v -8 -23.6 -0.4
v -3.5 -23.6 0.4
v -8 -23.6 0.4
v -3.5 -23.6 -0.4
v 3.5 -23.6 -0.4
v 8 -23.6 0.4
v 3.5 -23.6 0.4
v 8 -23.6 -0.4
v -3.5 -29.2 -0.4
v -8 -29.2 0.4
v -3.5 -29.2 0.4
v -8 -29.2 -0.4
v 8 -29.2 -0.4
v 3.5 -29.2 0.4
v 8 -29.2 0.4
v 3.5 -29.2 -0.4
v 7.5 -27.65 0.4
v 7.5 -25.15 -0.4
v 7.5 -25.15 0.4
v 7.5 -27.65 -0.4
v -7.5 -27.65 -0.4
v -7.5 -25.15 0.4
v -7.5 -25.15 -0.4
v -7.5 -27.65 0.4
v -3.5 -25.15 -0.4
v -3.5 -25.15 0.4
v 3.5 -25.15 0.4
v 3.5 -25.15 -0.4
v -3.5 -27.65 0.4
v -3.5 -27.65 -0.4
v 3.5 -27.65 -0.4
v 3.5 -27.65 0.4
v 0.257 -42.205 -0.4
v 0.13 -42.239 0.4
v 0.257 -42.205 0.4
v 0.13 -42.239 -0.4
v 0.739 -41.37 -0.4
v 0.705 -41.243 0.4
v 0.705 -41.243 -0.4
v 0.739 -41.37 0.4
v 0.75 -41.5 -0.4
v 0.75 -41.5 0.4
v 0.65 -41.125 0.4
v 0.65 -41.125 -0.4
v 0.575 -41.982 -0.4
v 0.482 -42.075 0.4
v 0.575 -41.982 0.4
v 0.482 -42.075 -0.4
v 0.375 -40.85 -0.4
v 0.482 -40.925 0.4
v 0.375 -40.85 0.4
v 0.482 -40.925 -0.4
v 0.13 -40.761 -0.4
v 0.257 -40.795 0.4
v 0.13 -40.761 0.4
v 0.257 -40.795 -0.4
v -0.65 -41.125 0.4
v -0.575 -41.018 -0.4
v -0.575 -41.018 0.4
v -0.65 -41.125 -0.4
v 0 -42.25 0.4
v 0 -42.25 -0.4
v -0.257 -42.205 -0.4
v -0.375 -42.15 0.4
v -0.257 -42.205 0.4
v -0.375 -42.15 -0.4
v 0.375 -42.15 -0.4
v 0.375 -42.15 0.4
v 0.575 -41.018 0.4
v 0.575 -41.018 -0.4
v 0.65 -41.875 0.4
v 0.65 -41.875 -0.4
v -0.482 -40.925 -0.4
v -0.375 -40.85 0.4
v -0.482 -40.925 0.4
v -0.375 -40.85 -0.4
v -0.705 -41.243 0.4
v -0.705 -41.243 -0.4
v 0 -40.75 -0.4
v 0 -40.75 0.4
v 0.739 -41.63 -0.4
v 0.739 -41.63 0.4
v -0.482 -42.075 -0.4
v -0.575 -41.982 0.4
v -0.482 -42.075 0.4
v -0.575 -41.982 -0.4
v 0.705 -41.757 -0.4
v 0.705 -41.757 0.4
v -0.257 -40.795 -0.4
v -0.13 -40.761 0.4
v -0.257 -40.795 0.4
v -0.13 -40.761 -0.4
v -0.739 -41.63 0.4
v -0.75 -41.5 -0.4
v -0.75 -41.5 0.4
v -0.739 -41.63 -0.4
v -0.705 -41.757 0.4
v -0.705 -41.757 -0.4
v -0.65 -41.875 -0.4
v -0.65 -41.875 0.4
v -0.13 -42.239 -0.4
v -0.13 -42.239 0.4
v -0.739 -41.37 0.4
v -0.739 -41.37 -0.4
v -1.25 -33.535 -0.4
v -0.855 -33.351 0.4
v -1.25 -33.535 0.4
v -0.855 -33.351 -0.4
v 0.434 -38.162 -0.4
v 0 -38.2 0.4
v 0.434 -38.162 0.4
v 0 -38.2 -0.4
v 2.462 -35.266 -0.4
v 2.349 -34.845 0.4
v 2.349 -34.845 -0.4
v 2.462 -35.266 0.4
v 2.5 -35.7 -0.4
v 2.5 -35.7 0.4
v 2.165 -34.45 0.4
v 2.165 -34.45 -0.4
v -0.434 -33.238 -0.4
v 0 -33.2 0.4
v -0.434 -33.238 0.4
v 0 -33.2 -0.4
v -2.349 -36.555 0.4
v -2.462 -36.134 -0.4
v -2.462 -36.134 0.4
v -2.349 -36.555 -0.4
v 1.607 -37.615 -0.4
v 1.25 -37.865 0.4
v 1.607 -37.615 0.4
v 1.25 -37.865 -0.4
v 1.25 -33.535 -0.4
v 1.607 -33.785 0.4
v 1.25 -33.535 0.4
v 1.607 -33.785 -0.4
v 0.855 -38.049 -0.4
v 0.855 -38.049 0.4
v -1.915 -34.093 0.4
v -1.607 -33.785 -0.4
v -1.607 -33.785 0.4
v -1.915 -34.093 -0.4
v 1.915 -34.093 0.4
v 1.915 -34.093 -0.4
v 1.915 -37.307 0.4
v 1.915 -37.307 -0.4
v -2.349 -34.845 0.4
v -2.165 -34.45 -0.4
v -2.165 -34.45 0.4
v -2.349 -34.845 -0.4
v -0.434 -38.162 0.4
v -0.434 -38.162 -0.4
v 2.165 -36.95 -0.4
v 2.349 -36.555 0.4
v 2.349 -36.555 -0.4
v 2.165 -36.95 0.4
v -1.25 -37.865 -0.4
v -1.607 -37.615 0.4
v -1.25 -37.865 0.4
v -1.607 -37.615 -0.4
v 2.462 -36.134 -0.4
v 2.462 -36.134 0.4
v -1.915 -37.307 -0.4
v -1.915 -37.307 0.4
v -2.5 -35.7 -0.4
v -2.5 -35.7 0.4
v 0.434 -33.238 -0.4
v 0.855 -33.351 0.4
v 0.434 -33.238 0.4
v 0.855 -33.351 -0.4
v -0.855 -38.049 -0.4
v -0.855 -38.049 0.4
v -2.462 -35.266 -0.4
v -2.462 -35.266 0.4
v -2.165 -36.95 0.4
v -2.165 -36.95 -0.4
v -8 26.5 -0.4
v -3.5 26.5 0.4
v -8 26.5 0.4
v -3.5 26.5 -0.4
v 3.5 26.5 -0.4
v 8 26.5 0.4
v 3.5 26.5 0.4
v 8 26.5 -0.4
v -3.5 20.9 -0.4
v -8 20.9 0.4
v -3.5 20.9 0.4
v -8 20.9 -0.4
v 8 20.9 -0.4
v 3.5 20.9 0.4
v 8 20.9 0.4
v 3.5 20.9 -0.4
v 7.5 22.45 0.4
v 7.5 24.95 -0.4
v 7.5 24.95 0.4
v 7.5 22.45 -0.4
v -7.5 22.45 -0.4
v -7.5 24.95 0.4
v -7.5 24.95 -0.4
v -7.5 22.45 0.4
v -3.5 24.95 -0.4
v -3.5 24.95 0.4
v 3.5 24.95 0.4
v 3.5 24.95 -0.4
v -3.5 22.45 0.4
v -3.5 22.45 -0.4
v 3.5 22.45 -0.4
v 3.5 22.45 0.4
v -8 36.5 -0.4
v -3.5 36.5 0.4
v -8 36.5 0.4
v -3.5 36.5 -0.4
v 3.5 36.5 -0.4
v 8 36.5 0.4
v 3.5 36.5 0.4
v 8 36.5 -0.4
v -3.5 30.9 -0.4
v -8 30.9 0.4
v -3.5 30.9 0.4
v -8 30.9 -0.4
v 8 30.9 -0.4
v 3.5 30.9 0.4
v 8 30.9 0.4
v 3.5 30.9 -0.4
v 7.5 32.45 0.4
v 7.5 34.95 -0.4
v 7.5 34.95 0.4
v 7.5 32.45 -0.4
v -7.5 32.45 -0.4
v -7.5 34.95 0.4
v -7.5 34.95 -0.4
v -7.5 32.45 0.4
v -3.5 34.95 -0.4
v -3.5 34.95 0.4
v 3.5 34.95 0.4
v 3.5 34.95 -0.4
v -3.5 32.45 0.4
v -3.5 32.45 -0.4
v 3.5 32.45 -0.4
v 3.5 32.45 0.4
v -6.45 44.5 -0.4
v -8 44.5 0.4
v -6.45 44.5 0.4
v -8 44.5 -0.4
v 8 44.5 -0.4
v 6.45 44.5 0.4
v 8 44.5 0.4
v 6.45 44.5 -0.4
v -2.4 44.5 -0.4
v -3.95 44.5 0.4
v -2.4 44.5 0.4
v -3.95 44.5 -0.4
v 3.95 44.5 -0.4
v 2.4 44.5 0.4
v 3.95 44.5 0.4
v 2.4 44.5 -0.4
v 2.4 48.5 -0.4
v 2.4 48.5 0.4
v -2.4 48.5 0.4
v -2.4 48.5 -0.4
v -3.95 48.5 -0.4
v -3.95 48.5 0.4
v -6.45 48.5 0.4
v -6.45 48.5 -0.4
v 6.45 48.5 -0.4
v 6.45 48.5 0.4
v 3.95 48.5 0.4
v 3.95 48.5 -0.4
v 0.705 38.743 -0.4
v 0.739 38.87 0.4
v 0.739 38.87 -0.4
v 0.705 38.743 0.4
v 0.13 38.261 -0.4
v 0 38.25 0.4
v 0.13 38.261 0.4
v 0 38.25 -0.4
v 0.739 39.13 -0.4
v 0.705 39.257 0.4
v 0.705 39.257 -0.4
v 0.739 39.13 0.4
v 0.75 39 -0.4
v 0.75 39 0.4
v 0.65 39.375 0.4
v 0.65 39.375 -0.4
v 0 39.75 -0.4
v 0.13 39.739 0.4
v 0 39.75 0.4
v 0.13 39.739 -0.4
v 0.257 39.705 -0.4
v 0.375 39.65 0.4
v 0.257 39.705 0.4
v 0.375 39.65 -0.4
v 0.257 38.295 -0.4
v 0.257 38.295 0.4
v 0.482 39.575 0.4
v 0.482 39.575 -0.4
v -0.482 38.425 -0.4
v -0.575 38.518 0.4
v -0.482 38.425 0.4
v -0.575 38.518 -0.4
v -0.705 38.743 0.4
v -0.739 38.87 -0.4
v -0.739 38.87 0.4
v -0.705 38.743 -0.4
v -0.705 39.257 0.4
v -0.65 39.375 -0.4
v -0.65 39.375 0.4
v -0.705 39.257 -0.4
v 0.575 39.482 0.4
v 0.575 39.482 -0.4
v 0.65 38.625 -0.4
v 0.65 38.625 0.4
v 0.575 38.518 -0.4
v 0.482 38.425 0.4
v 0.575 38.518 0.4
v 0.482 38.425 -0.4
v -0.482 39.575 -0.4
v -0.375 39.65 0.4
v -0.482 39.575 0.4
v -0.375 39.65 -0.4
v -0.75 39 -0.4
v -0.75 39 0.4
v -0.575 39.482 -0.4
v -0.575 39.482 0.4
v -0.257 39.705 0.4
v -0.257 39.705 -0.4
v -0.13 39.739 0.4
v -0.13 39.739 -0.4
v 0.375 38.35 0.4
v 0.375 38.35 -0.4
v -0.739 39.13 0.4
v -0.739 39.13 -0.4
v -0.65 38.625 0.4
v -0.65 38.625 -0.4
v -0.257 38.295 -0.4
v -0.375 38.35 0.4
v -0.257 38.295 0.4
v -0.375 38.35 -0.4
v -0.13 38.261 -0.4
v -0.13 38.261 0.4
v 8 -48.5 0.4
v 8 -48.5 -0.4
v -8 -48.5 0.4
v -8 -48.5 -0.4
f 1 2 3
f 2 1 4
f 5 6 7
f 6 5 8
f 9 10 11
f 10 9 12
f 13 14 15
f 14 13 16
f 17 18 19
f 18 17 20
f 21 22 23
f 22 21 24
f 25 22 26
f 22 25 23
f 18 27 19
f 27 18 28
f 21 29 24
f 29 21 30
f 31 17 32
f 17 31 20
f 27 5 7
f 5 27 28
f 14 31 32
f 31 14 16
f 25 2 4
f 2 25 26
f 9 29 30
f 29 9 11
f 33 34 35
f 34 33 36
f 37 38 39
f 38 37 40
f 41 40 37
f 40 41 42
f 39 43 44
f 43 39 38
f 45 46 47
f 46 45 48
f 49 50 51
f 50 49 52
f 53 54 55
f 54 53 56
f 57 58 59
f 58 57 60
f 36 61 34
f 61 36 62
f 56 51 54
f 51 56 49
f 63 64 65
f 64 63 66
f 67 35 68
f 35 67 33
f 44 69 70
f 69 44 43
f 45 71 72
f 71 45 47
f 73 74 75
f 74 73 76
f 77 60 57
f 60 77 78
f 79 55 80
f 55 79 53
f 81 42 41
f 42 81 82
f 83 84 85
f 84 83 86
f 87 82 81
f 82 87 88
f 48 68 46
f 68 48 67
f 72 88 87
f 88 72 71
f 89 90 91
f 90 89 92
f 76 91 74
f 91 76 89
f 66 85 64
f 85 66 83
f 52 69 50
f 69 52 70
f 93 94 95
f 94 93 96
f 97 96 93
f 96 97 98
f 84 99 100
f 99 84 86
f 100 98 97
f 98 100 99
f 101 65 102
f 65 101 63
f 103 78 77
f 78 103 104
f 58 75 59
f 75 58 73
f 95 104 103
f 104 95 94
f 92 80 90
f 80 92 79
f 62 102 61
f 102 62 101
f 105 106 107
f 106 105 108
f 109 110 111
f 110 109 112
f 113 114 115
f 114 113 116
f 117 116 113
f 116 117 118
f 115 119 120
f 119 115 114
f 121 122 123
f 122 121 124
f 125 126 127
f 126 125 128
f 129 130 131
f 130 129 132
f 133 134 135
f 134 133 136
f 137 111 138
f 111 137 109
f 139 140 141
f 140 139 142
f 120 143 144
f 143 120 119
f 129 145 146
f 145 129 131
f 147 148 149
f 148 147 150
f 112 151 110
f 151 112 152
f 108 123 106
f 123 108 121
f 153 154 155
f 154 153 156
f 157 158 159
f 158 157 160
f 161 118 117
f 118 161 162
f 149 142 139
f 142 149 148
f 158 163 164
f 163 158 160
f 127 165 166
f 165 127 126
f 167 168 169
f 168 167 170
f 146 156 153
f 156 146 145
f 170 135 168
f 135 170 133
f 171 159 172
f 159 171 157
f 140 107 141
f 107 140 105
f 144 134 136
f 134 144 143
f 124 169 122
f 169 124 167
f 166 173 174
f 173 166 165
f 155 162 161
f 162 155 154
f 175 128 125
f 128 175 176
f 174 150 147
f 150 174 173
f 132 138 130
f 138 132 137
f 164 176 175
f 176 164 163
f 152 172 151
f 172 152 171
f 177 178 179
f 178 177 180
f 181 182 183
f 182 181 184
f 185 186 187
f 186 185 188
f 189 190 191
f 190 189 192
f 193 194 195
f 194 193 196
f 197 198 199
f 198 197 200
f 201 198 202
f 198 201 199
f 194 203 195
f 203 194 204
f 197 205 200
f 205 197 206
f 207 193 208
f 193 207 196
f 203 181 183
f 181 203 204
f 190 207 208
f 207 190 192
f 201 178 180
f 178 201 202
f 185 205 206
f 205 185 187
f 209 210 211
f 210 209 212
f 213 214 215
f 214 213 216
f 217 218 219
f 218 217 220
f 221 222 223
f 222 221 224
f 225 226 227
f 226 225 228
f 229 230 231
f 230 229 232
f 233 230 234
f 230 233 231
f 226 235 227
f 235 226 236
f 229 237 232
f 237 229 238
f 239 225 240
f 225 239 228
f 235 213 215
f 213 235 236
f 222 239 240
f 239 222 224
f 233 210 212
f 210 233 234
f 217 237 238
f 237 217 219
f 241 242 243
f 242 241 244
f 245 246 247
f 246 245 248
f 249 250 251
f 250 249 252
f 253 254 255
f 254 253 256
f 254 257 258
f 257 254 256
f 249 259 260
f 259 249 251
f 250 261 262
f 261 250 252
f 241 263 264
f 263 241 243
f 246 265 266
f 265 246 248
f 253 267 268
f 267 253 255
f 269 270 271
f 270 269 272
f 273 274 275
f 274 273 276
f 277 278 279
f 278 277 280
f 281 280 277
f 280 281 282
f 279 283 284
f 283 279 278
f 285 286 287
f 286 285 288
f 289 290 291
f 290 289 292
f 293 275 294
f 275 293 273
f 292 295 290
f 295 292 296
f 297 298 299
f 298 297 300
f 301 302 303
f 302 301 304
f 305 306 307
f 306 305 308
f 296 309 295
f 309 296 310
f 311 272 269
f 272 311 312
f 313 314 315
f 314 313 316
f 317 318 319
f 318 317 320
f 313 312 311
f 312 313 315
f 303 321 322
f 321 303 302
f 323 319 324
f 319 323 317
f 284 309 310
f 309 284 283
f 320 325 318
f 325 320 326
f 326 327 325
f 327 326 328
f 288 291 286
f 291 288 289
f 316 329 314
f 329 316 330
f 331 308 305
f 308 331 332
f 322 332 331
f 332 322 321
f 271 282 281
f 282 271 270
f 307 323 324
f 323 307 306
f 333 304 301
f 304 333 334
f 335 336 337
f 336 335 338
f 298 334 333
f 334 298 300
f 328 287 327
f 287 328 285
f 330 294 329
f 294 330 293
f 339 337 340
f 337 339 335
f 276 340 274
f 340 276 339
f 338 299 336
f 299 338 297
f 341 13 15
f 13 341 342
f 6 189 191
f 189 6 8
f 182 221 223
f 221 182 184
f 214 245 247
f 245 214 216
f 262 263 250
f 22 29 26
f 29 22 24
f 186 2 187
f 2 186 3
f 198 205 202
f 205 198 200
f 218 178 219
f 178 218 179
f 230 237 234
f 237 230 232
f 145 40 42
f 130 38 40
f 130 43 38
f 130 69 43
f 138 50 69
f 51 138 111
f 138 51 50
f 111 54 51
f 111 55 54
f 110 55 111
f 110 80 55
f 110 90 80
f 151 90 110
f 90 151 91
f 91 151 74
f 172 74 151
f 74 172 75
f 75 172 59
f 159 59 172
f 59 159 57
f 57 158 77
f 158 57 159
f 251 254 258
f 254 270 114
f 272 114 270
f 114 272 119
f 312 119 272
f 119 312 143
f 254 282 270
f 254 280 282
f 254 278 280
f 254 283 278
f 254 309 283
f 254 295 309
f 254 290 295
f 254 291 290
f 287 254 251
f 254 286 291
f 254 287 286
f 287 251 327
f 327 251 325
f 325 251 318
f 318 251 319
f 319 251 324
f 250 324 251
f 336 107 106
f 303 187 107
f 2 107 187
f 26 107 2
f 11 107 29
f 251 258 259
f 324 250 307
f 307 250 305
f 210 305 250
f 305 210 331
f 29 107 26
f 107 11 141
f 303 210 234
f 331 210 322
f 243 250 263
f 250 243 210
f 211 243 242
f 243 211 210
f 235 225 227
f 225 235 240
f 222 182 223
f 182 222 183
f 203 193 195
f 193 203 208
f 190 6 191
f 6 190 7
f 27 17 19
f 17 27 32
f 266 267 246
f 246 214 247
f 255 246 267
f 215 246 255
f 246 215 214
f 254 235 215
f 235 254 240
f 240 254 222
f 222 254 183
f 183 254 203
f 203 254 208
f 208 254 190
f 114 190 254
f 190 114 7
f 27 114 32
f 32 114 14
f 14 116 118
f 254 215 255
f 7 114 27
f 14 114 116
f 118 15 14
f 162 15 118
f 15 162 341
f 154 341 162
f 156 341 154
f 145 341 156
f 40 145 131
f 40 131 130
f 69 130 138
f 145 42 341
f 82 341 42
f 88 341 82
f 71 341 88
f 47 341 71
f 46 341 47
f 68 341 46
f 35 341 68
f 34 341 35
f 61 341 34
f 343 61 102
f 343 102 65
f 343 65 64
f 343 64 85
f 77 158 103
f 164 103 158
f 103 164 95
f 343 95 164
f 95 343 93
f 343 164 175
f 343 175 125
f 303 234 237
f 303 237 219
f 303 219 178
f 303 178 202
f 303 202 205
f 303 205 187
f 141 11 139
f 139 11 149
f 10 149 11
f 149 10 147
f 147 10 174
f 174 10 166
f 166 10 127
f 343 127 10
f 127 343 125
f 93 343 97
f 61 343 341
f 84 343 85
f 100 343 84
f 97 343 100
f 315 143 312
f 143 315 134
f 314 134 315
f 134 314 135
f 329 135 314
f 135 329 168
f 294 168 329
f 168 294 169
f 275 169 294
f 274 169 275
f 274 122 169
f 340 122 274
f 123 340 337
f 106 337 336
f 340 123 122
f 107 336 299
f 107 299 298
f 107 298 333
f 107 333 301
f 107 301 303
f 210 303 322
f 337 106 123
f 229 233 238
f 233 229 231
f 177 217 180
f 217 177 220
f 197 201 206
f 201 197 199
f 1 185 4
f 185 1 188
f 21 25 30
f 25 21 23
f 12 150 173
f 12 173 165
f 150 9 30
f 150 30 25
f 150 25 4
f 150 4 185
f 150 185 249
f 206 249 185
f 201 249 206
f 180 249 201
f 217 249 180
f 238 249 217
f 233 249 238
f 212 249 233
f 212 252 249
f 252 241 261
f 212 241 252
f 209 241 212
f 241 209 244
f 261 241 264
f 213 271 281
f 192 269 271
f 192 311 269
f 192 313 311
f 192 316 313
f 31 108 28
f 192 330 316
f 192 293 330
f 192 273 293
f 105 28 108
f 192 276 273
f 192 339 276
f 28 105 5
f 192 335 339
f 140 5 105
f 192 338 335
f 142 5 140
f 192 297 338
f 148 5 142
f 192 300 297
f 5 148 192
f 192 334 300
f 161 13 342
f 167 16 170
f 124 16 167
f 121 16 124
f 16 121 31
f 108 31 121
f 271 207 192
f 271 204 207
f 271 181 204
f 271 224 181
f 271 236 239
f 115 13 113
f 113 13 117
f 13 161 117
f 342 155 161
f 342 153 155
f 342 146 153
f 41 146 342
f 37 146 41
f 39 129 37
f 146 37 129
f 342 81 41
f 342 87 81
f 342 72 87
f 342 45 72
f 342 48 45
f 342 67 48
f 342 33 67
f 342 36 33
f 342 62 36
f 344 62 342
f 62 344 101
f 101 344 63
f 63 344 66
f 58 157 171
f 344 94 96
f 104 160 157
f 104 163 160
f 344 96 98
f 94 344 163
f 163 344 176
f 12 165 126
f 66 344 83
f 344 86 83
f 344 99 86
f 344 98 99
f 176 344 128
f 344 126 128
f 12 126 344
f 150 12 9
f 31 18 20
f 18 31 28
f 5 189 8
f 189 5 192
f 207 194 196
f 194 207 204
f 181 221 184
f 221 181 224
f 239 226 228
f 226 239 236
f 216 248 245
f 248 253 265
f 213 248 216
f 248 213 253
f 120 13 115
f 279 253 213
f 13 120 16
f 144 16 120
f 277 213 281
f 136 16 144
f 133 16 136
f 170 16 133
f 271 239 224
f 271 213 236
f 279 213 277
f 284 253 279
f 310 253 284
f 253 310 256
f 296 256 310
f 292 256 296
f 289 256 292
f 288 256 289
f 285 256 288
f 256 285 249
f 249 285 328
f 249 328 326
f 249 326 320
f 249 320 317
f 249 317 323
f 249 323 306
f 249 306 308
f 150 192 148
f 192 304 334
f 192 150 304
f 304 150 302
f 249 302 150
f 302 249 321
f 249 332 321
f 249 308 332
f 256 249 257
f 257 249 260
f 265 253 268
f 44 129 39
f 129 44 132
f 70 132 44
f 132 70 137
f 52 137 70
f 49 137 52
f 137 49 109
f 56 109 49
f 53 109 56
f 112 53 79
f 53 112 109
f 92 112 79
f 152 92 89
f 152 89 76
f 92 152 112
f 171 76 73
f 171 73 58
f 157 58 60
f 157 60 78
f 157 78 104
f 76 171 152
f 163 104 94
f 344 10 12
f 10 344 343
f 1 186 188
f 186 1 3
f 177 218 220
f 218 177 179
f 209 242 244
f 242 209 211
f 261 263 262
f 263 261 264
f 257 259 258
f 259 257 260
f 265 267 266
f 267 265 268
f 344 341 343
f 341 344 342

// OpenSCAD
$fn = 36;

PCBwidth = 16;
PCBlength = 97;
PCBthickness = 0.8;

module screwHole() {
  cylinder(1, d = 1.5, center = true);
}

// Side tabs are 4mm long and 2.5mm wide
// Their cutouts are 4.5mm deep and 5.6mm wide
module sideTabs() {
  difference() {
    cube([18, 5.6, 1], true);
    cube([15, 2.5, 1.2], true);
    cube([7, 6, 1.2], true);
  }
}

module frontTabs() {
  difference() {
    cube([18, 5, 1], true);
    cube([4.8, 6, 1.2], true);
    translate([-5.2, 0, 0])
    cube([2.5, 6, 1.2], true);
    translate([5.2, 0, 0])
    cube([2.5, 6, 1.2], true);
  }
}

module PCB() {
  color("green")
  difference() {
    cube([PCBwidth, PCBlength, PCBthickness], true);
    translate([0, -PCBlength / 2, 0]) {
      translate([0, 7, 0])
      screwHole();
      translate([0, 12.8, 0])
      cylinder(1, d = 5, center = true);
      translate([0, 22.1, 0])
      sideTabs();
    }
    translate([0, PCBlength / 2, 0]) {
      translate([0, -24.8, 0])
      sideTabs();
      translate([0, -14.8, 0])
      sideTabs();
      translate([0, -9.5, 0])
      screwHole();
      translate([0, -1.5, 0])
      frontTabs();
    }
  }
}

PCB();
